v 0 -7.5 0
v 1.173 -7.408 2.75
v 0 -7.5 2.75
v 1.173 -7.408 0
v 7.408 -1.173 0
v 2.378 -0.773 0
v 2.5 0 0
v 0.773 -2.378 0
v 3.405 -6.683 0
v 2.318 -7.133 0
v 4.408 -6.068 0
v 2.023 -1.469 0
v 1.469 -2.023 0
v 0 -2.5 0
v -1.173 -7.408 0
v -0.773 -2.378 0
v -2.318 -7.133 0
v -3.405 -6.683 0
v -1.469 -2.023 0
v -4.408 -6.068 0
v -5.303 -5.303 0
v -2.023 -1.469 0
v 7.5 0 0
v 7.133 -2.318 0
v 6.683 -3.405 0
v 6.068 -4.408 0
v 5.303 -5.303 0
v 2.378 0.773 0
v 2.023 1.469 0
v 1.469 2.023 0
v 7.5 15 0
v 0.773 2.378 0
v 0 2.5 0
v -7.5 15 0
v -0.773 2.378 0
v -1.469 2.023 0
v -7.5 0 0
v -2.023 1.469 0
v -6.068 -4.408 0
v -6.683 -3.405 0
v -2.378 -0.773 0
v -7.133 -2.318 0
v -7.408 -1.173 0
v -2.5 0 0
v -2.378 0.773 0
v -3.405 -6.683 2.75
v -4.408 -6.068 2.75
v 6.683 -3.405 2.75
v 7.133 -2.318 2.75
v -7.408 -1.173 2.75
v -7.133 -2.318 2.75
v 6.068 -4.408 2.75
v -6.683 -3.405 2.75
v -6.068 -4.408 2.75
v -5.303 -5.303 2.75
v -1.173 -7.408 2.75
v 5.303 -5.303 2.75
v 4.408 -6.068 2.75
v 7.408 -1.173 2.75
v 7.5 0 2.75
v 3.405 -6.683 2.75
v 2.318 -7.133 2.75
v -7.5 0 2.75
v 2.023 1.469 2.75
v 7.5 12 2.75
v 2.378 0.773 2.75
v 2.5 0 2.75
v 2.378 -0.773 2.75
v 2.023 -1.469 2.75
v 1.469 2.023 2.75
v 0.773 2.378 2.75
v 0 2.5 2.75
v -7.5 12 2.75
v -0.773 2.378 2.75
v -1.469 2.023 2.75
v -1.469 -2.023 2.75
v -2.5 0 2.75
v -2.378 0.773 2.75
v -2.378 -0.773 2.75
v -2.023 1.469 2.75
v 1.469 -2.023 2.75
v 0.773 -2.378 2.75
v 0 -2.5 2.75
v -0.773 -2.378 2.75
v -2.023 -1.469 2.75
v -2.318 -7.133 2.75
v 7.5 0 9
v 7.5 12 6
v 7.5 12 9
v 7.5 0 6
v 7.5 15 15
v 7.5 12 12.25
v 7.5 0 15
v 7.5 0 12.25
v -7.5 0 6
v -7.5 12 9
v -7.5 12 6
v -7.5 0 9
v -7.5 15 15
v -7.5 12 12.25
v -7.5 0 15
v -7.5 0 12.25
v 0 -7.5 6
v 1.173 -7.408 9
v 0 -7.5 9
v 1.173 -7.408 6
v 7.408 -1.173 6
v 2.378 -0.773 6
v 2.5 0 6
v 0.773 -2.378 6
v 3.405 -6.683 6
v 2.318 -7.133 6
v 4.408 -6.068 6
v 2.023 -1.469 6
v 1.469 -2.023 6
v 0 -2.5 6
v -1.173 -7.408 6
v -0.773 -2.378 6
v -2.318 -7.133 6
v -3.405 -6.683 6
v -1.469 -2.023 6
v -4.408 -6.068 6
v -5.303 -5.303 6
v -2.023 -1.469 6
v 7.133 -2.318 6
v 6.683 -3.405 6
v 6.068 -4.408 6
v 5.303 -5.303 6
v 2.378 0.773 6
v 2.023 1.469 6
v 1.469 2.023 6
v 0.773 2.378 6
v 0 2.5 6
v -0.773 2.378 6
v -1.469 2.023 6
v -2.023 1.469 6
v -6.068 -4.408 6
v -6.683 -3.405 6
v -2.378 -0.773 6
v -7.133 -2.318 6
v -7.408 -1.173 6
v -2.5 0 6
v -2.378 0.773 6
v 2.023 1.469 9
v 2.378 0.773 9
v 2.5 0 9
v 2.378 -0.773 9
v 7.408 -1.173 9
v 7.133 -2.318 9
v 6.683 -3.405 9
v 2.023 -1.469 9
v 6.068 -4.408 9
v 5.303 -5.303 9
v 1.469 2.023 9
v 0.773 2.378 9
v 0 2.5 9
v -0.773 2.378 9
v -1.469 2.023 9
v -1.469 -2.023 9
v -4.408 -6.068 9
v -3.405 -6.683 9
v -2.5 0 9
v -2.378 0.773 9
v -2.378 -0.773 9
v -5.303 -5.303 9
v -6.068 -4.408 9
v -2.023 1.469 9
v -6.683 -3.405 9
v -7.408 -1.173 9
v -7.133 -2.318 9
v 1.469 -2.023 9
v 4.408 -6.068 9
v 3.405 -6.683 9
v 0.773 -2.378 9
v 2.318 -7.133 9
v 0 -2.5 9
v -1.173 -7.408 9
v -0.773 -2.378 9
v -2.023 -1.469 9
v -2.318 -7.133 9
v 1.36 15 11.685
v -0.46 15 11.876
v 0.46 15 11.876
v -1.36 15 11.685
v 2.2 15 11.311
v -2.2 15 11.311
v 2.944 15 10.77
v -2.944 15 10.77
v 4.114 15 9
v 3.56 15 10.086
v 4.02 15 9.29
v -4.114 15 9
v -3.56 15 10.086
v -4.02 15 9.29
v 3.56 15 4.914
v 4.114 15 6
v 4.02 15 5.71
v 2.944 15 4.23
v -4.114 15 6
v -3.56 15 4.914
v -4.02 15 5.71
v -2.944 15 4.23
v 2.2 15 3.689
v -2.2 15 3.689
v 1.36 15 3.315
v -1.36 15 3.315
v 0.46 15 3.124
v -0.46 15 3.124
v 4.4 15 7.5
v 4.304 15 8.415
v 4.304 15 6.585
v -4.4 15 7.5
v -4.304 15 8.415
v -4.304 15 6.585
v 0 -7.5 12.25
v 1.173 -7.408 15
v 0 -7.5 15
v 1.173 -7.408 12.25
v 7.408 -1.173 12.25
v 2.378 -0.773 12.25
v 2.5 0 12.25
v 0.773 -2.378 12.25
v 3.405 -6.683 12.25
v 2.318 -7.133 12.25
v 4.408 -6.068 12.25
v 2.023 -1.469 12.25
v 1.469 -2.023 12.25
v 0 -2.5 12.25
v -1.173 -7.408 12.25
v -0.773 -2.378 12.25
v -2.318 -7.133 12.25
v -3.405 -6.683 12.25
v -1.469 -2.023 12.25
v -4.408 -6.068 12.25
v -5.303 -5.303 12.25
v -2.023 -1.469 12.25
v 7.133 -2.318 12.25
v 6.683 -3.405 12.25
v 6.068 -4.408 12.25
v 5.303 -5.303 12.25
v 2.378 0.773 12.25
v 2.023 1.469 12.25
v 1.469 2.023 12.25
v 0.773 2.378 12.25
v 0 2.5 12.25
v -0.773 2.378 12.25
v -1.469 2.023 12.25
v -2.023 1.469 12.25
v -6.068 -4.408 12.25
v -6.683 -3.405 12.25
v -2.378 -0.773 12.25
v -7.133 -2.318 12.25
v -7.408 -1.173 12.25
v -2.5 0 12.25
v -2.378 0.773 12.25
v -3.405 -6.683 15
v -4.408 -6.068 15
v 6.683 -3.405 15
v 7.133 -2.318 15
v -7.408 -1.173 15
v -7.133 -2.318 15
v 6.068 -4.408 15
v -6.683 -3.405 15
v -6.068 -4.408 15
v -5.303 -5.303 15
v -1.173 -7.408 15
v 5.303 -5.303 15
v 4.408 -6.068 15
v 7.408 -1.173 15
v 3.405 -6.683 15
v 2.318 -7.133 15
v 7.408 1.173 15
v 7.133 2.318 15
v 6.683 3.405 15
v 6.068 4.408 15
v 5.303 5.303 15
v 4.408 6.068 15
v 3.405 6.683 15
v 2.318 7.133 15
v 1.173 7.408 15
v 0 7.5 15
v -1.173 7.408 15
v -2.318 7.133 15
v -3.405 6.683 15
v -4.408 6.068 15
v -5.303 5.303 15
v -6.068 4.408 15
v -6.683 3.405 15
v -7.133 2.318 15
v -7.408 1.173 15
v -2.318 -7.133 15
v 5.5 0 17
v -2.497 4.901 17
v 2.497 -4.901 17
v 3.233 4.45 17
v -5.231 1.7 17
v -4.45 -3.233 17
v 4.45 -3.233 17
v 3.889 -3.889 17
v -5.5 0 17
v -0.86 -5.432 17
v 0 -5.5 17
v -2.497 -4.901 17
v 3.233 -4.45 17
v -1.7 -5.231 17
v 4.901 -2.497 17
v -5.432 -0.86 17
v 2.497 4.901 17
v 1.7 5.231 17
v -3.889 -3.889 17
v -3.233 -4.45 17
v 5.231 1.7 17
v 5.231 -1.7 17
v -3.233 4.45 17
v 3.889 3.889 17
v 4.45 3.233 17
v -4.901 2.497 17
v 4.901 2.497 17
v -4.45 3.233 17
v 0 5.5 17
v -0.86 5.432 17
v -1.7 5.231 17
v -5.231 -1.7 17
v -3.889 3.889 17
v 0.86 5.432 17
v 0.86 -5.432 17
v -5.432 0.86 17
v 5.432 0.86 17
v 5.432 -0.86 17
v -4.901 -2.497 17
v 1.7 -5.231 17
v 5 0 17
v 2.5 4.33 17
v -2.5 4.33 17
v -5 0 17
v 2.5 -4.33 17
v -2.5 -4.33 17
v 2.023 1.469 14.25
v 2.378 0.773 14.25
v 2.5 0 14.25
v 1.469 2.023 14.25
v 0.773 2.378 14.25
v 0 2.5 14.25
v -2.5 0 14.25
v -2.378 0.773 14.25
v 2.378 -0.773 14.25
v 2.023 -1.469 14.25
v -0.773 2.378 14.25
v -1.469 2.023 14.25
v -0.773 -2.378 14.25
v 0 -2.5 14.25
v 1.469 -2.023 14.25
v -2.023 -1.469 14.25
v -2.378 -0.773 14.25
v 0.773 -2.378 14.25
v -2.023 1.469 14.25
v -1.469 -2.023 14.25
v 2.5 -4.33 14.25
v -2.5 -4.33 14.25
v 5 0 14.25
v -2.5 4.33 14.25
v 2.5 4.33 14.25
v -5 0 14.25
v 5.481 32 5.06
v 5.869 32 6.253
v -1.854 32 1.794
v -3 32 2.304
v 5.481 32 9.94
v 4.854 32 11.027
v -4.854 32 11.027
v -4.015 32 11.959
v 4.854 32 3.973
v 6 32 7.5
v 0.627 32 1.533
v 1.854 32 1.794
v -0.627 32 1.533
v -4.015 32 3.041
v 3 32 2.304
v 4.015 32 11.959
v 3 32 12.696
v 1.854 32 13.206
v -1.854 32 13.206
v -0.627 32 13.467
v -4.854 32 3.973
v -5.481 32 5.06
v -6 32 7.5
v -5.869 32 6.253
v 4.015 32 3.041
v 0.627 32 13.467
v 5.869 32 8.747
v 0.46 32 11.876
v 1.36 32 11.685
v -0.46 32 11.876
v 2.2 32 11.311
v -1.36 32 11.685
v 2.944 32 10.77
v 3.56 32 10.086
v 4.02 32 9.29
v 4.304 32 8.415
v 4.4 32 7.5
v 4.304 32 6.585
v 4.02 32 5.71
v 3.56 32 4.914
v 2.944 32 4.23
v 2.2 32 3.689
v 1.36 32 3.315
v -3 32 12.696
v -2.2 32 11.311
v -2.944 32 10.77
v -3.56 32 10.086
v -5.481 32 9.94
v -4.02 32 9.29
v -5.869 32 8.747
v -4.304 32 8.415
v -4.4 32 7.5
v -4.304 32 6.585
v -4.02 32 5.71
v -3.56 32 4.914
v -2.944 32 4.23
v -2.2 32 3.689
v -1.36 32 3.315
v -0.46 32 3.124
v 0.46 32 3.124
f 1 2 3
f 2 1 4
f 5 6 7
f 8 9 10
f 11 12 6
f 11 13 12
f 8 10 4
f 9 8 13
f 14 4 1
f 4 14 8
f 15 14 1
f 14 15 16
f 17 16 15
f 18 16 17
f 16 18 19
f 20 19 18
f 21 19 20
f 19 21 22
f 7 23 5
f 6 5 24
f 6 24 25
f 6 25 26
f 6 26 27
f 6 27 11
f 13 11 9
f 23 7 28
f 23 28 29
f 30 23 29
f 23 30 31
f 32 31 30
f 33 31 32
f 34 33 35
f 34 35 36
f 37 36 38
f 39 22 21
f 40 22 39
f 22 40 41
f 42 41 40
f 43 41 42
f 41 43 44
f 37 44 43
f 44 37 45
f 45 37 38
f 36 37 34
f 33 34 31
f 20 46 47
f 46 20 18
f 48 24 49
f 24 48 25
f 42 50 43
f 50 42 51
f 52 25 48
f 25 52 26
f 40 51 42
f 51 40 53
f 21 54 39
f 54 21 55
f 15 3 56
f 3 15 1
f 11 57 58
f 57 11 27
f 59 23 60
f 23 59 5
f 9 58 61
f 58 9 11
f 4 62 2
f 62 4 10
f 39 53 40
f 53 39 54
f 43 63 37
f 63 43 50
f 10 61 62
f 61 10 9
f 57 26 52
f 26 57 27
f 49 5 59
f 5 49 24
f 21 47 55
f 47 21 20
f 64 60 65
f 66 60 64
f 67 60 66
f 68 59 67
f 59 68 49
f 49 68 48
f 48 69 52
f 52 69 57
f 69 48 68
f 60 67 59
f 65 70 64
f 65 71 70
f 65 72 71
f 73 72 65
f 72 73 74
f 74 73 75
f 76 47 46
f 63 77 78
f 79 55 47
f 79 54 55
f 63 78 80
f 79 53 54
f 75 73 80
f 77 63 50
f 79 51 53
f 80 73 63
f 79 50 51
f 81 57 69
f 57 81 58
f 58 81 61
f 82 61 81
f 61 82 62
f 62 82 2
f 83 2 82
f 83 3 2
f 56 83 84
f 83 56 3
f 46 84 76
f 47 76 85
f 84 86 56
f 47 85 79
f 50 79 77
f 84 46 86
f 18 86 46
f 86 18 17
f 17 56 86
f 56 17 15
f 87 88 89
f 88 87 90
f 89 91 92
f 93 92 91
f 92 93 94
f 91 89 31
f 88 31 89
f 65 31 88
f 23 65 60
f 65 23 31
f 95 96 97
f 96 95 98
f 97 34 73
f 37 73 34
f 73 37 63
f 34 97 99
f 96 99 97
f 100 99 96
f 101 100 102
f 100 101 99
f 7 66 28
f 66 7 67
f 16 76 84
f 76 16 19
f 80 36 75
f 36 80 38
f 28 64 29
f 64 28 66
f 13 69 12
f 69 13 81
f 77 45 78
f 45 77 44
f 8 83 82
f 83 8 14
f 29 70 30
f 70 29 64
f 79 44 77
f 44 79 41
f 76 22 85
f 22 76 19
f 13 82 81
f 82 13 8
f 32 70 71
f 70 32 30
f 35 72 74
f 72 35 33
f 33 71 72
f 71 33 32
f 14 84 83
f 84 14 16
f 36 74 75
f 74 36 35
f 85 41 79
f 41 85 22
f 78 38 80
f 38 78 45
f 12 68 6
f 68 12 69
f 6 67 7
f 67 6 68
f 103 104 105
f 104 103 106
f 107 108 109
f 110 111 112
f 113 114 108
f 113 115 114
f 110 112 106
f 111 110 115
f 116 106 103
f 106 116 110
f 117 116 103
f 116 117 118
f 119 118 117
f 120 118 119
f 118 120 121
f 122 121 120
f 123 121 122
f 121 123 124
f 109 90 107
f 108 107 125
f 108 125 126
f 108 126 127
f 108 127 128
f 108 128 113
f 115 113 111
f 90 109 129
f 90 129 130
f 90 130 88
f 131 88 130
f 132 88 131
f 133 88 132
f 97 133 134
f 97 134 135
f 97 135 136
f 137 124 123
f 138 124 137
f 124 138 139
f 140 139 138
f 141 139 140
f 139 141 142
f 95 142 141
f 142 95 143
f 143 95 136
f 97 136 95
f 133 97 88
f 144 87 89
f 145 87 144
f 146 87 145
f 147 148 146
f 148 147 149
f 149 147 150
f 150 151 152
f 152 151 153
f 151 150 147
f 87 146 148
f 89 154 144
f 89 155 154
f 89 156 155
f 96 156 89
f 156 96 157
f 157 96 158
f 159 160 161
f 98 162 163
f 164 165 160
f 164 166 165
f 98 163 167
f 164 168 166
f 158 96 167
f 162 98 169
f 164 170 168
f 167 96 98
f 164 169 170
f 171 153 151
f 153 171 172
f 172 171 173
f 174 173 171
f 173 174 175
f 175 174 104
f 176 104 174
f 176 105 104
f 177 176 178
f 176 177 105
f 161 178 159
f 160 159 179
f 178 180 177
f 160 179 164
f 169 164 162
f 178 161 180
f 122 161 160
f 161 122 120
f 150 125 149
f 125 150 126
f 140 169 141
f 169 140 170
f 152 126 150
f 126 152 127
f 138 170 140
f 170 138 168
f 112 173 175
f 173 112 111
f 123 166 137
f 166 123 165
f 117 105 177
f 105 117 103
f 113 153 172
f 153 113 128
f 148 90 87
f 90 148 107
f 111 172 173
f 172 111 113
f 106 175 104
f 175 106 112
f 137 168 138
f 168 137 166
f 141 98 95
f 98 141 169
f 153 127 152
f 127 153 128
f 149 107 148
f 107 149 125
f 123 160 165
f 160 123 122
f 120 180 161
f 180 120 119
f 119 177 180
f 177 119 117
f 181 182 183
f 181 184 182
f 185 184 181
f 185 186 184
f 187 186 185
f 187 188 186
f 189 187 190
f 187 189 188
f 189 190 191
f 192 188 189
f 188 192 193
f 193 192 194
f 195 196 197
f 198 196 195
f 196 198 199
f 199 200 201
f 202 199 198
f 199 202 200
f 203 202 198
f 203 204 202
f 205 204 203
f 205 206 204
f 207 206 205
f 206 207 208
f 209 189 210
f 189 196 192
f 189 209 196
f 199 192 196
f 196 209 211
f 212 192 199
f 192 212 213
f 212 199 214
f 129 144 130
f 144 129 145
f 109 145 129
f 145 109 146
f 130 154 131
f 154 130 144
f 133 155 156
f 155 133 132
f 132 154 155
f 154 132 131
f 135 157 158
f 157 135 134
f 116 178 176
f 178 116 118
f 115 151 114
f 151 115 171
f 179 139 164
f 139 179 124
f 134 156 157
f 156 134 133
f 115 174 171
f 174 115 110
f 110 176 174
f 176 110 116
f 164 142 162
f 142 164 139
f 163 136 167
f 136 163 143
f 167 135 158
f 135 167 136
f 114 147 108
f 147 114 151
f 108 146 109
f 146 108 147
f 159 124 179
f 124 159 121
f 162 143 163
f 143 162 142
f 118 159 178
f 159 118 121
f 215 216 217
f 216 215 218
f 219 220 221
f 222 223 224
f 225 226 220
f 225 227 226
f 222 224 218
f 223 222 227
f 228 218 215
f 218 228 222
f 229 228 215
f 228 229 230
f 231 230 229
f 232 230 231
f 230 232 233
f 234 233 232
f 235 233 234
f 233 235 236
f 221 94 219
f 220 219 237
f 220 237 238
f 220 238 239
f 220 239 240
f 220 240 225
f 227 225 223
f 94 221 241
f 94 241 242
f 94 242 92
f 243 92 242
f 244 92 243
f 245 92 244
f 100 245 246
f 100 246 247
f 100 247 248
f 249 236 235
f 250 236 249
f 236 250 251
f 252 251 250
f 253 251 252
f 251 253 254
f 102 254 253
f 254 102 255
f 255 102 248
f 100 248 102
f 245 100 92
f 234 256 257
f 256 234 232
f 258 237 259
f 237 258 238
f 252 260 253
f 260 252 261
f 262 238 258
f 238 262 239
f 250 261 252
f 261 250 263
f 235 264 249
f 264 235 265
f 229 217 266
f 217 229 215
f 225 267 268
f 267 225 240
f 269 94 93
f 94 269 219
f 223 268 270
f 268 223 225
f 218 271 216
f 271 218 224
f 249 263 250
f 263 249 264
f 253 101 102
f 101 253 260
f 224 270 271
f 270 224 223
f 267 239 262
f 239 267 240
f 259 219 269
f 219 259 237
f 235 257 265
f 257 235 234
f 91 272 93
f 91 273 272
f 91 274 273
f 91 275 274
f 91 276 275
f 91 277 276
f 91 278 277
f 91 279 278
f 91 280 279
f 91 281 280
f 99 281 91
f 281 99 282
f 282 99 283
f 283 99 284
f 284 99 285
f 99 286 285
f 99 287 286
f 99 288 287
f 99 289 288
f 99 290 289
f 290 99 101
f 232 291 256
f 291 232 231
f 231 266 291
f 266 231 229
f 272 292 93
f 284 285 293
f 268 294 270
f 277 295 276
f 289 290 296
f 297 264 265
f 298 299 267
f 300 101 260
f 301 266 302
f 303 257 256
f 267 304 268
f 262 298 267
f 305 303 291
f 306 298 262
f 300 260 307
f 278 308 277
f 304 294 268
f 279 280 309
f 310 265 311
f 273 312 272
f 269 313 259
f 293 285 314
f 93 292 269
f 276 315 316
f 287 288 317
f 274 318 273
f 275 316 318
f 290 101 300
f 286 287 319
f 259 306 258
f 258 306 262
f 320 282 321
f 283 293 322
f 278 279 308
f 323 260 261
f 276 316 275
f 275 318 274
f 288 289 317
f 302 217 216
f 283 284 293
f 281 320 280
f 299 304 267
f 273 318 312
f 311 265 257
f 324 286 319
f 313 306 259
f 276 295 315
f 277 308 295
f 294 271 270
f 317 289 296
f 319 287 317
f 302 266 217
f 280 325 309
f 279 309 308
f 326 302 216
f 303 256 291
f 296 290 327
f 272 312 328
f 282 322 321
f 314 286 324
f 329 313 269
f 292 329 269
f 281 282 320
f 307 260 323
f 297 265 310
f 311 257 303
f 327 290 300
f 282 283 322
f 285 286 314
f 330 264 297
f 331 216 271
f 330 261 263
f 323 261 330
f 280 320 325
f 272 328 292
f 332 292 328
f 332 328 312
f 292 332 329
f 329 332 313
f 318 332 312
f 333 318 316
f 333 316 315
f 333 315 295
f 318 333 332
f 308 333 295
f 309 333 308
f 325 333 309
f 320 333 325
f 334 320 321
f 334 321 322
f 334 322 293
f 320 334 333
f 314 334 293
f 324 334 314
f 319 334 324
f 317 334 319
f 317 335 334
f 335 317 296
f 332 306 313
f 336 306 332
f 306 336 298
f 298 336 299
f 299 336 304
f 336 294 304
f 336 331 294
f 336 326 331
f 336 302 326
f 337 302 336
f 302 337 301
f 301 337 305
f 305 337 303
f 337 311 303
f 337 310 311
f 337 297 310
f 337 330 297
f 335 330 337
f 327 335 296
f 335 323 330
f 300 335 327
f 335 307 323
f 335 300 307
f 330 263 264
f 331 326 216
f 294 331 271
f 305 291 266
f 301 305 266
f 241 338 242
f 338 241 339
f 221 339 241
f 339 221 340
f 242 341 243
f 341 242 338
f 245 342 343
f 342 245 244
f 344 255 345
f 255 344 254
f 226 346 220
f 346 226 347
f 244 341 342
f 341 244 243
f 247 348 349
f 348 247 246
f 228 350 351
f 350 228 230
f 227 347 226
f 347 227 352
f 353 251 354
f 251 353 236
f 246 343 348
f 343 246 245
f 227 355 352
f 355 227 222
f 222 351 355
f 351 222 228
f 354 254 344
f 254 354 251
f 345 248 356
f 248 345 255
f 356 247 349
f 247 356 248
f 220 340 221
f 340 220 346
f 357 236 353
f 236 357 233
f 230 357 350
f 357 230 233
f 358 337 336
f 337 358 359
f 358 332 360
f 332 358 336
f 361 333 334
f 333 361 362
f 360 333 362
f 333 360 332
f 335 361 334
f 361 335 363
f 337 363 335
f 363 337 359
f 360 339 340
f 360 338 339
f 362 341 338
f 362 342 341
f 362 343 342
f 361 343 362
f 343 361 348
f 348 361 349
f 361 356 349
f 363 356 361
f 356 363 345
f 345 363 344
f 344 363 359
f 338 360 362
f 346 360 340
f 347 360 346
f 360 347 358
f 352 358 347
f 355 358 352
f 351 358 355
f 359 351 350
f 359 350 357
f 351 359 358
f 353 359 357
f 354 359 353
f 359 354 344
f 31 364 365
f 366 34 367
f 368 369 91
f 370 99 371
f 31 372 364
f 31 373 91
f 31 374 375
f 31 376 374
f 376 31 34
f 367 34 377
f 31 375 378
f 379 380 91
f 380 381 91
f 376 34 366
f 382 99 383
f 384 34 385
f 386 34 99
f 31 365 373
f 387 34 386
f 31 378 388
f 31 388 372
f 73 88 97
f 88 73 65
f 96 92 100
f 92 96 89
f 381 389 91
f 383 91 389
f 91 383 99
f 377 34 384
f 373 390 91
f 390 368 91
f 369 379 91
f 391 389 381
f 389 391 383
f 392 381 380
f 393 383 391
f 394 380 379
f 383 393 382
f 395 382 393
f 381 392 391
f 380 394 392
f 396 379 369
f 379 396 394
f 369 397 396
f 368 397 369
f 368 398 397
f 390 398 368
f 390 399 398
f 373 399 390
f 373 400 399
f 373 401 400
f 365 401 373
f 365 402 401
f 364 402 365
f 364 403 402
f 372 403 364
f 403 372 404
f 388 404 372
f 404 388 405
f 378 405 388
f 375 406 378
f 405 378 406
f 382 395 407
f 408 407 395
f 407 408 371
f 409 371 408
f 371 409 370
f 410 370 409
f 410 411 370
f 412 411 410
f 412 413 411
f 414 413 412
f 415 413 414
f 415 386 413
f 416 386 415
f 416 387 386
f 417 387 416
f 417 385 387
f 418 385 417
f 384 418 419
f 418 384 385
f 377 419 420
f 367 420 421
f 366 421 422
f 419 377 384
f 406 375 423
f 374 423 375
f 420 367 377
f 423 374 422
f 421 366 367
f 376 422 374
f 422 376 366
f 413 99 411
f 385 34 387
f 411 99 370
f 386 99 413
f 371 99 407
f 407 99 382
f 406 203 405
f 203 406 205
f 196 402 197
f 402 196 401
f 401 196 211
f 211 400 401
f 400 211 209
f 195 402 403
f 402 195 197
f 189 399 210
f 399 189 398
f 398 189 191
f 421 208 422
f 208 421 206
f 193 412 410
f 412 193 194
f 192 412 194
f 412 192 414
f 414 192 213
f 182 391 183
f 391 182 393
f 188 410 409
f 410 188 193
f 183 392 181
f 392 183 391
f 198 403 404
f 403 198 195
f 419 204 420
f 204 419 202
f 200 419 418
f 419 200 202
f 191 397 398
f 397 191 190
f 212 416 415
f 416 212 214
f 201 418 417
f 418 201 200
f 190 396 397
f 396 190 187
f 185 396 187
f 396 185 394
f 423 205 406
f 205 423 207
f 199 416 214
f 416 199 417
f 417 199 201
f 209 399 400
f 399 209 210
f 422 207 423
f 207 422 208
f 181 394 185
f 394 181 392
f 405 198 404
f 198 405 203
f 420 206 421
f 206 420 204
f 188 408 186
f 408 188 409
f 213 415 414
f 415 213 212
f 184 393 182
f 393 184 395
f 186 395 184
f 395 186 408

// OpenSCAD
difference(){
union(){
cylinder(r=7.5,h=2.75,$fn=40);
translate([-7.5,0,0])cube([15,15,2.75]);
}
cylinder(d=5,h=3,$fn=20);
}

translate([0,0,6])
difference(){
union(){
cylinder(r=7.5,h=3,$fn=40);
translate([-7.5,0,0])cube([15,15,3]);
}
cylinder(d=5,h=3,$fn=20);
}

translate([0,0,12.25])
difference(){
union(){
cylinder(r=7.5,h=2.75,$fn=40);
translate([0,0,2.75])cylinder(r1=7.5,r2=5.5,h=2,$fn=40);    
translate([-7.5,0,0])cube([15,15,2.75]);
}
cylinder(d=5,h=6,$fn=20);
translate([0,0,2])cylinder(d=10,h=3,$fn=6);
}
difference(){
hull(){
translate([-7.5,12,0])cube([15,3,15]);
translate([0,12,7.5])rotate([-90,0,0])
cylinder(d=12,h=20,$fn=30);
}
translate([0,15,7.5])rotate([-90,0,0])
cylinder(d=8.8,h=20,$fn=30);
}
